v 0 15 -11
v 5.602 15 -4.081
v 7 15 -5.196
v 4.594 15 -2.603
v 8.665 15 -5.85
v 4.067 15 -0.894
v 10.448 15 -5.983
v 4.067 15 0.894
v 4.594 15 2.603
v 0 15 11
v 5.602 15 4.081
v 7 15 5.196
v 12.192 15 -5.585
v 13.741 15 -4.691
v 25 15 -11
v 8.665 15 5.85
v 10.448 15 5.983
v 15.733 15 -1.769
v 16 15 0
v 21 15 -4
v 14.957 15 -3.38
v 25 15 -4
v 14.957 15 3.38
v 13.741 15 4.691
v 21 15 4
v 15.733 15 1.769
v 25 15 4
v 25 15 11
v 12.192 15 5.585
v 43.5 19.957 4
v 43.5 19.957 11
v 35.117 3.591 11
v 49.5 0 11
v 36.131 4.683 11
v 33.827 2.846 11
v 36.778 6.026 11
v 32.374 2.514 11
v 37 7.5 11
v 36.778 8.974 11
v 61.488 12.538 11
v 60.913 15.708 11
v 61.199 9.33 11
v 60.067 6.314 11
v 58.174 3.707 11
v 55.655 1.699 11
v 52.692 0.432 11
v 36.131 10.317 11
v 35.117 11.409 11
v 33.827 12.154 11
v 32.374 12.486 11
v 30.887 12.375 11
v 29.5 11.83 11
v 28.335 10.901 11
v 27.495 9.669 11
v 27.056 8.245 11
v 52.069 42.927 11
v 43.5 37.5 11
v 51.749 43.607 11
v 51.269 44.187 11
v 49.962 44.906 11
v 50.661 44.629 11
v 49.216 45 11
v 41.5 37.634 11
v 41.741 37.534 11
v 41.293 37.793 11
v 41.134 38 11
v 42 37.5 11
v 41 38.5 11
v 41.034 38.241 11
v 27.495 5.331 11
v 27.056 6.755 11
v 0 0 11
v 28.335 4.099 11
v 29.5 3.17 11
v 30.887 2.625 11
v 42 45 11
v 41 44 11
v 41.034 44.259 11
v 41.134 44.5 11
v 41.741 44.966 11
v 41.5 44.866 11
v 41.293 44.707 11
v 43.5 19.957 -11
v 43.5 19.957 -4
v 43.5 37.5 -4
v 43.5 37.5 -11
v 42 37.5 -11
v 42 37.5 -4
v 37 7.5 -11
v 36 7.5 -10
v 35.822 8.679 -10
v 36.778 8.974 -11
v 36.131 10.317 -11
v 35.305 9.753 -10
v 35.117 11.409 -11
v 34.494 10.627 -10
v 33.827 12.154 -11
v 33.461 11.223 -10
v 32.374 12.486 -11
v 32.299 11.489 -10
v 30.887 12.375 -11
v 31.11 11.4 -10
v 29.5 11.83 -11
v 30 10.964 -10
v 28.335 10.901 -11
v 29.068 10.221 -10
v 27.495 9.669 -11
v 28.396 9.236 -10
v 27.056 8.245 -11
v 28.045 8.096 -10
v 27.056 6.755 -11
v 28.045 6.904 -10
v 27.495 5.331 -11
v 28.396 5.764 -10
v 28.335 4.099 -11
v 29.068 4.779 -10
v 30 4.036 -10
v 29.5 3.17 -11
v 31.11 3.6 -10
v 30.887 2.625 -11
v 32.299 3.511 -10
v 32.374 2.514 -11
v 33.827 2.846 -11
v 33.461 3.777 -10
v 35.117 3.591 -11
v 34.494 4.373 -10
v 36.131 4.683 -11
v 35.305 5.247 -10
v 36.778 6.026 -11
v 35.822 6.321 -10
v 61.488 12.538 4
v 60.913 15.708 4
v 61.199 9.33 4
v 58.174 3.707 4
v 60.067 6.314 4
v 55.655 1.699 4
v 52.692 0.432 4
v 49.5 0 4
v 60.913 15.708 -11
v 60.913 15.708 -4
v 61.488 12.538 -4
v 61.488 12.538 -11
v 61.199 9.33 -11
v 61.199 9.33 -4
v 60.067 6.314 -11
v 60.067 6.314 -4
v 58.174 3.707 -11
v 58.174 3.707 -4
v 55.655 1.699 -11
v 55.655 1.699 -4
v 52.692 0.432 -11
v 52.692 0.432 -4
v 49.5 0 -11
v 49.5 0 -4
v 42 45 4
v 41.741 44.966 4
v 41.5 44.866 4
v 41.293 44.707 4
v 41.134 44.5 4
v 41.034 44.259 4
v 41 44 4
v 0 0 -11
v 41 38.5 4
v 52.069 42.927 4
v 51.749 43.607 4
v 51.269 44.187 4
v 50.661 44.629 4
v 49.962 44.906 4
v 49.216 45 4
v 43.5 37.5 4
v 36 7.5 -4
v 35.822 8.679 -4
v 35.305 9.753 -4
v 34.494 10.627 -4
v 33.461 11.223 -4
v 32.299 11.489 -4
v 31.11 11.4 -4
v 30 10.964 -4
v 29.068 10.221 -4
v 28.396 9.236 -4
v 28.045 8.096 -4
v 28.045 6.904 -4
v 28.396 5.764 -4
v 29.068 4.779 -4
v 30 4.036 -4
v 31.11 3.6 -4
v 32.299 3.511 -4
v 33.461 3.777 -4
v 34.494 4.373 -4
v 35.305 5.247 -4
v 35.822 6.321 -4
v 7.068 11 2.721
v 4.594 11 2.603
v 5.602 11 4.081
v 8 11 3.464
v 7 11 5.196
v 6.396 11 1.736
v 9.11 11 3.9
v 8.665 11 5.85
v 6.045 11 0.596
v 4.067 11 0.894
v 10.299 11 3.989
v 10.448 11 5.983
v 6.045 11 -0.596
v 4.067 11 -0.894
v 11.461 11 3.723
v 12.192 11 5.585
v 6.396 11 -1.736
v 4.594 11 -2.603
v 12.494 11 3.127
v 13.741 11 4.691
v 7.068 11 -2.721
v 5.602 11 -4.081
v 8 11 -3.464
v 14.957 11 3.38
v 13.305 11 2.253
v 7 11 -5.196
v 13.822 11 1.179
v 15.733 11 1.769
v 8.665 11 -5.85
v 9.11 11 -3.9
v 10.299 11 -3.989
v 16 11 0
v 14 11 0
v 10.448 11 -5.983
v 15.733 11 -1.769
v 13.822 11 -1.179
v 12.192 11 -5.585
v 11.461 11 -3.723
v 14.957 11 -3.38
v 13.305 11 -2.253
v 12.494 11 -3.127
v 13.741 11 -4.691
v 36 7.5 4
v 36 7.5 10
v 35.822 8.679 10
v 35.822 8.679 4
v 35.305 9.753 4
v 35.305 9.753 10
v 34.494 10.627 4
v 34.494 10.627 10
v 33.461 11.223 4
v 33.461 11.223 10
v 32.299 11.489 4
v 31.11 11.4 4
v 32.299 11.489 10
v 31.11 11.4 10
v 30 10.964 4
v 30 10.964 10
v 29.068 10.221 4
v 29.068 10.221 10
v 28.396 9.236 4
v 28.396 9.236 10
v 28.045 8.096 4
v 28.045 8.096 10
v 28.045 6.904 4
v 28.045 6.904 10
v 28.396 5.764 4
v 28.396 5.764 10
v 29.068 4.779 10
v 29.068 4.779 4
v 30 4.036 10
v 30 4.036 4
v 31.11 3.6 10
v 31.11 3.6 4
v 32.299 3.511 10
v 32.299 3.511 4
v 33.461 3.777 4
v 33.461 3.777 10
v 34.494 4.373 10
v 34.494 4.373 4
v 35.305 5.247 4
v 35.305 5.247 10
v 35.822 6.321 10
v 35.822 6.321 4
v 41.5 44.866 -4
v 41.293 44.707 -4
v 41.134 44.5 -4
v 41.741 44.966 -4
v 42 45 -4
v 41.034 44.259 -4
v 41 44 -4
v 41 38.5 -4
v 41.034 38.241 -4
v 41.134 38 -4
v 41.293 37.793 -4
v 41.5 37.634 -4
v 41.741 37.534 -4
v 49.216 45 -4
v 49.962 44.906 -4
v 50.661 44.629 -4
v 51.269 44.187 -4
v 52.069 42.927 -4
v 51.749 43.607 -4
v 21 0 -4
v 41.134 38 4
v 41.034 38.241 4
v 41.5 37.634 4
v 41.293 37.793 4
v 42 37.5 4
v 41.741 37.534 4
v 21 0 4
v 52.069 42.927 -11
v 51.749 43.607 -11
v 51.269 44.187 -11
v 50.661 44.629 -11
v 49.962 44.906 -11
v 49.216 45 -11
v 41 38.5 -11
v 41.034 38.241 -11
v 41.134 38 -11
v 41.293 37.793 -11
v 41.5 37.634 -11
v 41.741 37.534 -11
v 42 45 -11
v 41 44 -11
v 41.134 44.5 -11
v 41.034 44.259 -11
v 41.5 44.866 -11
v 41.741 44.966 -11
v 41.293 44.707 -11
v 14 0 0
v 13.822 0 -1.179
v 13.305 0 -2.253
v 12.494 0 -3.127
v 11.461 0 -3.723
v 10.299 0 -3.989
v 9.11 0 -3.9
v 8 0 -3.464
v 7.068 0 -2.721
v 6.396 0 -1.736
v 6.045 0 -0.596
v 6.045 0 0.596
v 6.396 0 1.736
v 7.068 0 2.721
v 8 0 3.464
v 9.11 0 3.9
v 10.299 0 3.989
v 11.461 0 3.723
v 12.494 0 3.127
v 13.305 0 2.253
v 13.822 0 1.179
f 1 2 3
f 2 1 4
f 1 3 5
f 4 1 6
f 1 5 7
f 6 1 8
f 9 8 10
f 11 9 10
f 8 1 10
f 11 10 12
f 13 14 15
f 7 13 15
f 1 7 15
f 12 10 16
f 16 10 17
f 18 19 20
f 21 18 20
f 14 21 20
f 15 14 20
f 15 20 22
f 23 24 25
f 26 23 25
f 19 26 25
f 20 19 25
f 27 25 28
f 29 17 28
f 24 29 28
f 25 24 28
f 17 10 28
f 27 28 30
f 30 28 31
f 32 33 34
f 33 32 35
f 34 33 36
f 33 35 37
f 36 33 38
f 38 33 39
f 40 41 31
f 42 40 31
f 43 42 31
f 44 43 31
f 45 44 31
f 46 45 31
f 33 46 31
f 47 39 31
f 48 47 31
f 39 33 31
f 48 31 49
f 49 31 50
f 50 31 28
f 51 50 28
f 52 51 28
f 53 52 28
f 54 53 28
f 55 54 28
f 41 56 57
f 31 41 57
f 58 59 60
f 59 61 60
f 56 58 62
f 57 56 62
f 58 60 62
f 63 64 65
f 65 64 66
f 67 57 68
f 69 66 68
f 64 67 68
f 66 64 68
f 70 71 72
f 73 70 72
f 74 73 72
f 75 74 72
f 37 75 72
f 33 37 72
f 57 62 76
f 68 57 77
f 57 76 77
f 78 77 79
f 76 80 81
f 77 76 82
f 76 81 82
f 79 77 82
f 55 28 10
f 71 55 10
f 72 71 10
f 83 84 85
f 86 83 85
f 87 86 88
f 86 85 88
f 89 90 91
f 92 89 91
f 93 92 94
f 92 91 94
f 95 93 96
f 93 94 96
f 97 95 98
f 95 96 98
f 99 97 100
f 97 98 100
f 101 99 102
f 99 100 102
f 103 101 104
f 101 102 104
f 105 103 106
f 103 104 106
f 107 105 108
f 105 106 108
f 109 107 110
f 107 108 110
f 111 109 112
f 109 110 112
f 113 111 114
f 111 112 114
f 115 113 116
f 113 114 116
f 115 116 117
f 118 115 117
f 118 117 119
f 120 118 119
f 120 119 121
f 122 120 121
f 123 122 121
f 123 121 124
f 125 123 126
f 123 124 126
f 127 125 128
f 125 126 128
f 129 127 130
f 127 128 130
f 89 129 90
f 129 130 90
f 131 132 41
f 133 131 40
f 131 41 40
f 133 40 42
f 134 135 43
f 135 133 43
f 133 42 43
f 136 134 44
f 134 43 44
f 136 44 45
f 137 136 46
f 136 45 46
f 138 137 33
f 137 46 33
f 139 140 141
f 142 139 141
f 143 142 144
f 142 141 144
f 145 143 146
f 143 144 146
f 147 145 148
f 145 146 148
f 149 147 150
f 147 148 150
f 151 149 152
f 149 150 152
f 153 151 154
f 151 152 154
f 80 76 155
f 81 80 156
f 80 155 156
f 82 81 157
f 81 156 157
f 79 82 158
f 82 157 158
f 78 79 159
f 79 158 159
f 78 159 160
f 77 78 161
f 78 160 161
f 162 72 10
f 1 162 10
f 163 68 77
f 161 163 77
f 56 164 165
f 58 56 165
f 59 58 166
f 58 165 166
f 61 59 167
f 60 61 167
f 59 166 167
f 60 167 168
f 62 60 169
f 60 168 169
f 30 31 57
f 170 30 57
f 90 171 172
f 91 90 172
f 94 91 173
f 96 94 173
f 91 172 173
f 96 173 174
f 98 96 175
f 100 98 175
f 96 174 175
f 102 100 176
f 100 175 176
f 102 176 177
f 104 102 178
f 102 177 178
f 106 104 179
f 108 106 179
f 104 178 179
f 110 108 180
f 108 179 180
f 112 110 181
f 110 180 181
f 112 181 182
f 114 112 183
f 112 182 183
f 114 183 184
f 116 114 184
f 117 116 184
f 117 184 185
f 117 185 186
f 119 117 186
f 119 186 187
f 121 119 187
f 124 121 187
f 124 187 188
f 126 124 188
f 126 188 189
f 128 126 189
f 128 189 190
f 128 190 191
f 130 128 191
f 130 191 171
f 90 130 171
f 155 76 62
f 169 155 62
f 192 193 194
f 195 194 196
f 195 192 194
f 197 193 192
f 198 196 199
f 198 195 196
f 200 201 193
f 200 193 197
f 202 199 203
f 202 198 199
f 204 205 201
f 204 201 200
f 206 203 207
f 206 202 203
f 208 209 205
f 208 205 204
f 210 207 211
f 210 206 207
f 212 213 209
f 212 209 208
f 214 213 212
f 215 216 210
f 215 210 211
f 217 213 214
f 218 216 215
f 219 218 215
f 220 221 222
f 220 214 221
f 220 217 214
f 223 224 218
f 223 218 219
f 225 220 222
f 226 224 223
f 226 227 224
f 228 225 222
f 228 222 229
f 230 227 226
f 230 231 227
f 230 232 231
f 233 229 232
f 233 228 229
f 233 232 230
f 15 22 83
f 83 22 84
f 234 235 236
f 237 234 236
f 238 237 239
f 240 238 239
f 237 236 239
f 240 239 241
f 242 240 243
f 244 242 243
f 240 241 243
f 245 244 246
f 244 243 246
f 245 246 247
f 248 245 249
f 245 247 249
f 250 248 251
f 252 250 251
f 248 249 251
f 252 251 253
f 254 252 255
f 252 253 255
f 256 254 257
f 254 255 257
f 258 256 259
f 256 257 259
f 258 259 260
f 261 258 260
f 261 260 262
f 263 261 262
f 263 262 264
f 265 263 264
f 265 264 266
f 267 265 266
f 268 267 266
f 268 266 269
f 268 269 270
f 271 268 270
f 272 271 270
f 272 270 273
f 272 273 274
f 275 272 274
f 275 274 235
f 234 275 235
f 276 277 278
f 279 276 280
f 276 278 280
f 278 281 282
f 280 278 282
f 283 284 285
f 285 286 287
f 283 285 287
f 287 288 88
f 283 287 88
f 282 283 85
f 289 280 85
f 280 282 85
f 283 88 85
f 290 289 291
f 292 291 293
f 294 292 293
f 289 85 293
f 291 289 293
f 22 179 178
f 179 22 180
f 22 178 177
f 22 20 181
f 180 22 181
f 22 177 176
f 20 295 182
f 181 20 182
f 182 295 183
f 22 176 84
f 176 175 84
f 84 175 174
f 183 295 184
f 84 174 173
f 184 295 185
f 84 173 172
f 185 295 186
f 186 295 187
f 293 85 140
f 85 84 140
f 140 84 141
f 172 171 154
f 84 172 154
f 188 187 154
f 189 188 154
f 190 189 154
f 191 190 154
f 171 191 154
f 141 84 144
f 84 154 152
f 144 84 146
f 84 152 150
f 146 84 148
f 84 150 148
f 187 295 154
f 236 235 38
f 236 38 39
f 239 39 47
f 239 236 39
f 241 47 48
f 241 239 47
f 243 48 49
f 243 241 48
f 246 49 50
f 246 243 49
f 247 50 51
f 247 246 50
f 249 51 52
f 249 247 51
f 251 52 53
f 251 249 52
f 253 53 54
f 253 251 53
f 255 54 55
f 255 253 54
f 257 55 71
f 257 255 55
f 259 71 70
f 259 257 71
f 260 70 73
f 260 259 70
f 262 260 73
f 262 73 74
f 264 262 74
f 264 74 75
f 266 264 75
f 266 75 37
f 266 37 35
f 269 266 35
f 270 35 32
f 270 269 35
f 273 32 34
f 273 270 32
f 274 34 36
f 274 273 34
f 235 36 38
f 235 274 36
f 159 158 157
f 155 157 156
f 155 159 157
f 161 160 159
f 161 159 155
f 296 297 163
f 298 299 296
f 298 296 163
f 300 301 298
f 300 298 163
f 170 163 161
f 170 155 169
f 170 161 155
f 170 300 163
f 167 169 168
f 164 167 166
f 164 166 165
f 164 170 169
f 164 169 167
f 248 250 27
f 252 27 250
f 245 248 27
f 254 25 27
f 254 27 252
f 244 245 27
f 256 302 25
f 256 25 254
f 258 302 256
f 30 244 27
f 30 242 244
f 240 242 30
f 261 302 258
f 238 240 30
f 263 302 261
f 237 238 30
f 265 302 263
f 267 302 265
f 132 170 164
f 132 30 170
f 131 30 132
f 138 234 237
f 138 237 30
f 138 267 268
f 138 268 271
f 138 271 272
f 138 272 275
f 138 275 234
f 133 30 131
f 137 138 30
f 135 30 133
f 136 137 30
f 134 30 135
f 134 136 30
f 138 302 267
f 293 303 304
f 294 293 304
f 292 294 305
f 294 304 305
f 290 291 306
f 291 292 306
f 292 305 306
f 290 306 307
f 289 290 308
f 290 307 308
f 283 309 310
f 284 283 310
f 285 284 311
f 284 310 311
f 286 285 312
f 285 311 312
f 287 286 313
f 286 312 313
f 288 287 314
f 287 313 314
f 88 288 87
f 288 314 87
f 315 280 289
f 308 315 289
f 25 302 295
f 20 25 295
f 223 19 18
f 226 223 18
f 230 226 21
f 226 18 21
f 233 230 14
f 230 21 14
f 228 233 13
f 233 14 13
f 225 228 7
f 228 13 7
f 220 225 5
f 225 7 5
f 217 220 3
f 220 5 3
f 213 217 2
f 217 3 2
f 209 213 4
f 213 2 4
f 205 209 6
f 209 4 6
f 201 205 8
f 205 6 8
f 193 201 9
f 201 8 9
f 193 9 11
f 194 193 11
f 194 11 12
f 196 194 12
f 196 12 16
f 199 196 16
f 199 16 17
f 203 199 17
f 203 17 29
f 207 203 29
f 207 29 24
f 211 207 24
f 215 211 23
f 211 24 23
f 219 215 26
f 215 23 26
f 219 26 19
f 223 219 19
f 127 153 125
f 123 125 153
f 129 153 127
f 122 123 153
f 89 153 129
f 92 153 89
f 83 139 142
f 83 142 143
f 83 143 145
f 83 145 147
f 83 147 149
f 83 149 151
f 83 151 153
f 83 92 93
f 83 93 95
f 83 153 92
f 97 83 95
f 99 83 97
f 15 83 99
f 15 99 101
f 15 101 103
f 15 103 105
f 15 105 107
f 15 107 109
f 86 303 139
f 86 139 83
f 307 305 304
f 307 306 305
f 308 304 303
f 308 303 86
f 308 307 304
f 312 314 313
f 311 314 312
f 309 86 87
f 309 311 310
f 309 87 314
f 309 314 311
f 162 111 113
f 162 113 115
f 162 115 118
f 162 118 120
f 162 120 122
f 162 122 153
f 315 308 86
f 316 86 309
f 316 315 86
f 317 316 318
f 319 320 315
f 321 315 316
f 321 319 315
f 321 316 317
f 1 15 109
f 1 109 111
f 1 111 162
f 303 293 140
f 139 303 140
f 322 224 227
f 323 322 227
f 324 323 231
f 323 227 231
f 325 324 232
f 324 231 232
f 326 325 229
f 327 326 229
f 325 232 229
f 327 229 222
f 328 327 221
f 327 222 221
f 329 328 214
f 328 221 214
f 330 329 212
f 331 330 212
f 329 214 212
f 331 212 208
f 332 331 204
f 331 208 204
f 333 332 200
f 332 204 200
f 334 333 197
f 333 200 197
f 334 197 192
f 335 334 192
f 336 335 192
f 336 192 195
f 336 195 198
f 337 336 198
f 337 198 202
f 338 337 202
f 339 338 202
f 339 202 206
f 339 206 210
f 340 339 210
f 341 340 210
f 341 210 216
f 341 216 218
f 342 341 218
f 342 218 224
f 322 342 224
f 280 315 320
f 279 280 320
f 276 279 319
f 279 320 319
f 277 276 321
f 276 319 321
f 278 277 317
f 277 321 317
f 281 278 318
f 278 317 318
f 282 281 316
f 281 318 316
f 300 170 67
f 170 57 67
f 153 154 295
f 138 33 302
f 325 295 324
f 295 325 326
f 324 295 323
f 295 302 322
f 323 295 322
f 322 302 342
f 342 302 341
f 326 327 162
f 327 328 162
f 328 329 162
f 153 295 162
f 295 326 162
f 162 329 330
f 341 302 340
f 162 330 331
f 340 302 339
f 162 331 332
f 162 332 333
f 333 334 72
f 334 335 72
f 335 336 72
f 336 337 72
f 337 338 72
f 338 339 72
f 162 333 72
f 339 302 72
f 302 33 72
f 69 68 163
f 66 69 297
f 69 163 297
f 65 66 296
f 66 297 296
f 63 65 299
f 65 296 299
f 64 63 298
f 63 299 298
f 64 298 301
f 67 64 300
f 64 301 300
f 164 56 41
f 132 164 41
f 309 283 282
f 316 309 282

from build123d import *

# Parameters (mm, degrees)
ESTRUSIONE_ESTRUSIONE2_DEPTH  = 11
RACCORDO1_R                   = 3
SCHIZZO2_R                    = 4
TAGLIO_ESTRUSIONE1_DEPTH      = 16
SCHIZZO2_3_R                  = 6
SCHIZZO2_3_R_2                = 4
TAGLIO_ESTRUSIONE2_DEPTH      = 4
RACCORDO2_R                   = 1
SCHIZZO3_W                    = 40.5
SCHIZZO3_H                    = 8
TAGLIO_ESTRUSIONE4_DEPTH      = 46
TAGLIO_ESTRUSIONE4_DEPTH_BACK = 1
SCHIZZO4_R                    = 4
TAGLIO_ESTRUSIONE5_DEPTH      = 23
SMUSSO1_SIZE                  = 1


with BuildPart() as part:
    # Schizzo1 → Estrusione-Estrusione2 (new body, symmetric)
    with BuildSketch(Plane.XY):
        with BuildLine():
            Line((0, 0), (0, 15))
            Line((0, 15), (25, 15))
            Line((25, 15), (43.5, 19.95706006))
            Line((43.5, 19.95706006), (43.5, 37.5))
            Line((43.5, 37.5), (41, 37.5))
            Line((41, 37.5), (41, 45))
            Line((41, 45), (51.395196715, 45))
            Line((51.395196715, 45), (60.912678196, 15.708203932))
            ThreePointArc((60.912678196, 15.708203932), (59.208203932, 4.946576972), (49.5, 0))
            Line((49.5, 0), (0, 0))
        make_face()
    extrude(amount=ESTRUSIONE_ESTRUSIONE2_DEPTH, both=True)

    # Raccordo1
    raccordo1_edges = [part.edges().sort_by_distance(p)[0] for p in [
        (51.395196715, 45, 0),
    ]]
    fillet(raccordo1_edges, radius=RACCORDO1_R)

    # Schizzo2 → Taglio-Estrusione1 (cut, through all)
    with BuildSketch(Plane(origin=(0, 15, 0), x_dir=(1, 0, 0), z_dir=(0, 1, 0))):
        with Locations((10, 0)):
            Circle(SCHIZZO2_R)
    extrude(amount=-TAGLIO_ESTRUSIONE1_DEPTH, mode=Mode.SUBTRACT)

    # Schizzo2<3> → Taglio-Estrusione2 (cut)
    with BuildSketch(Plane(origin=(0, 15, 0), x_dir=(1, 0, 0), z_dir=(0, 1, 0))):
        with Locations((10, 0)):
            Circle(SCHIZZO2_3_R)
        with Locations((10, 0)):
            Circle(SCHIZZO2_3_R_2, mode=Mode.SUBTRACT)
    extrude(amount=-TAGLIO_ESTRUSIONE2_DEPTH, mode=Mode.SUBTRACT)

    # Raccordo2
    raccordo2_edges = [part.edges().sort_by_distance(p)[0] for p in [
        (41, 37.5, 0),
        (41, 45, 0),
    ]]
    fillet(raccordo2_edges, radius=RACCORDO2_R)

    # Schizzo3 → Taglio-Estrusione4 (cut, two sides)
    with BuildSketch(Plane(origin=(0, 0, 0), x_dir=(1, 0, 0), z_dir=(0, 1, 0))) as taglio_estrusione4_sk:
        with Locations((41.25, 0)):
            Rectangle(SCHIZZO3_W, SCHIZZO3_H)
    extrude(amount=TAGLIO_ESTRUSIONE4_DEPTH, mode=Mode.SUBTRACT)
    extrude(taglio_estrusione4_sk.sketch, amount=-TAGLIO_ESTRUSIONE4_DEPTH_BACK, mode=Mode.SUBTRACT)

    # Schizzo4 → Taglio-Estrusione5 (cut, through all)
    with BuildSketch(Plane.XY.offset(11)):
        with Locations((32, 7.5)):
            Circle(SCHIZZO4_R)
    extrude(amount=-TAGLIO_ESTRUSIONE5_DEPTH, mode=Mode.SUBTRACT)

    # Smusso1
    smusso1_edges = [part.edges().sort_by_distance(p)[0] for p in [
        (28, 7.5, -11),
        (28, 7.5, 11),
    ]]
    chamfer(smusso1_edges, length=SMUSSO1_SIZE)


solid = part.part
